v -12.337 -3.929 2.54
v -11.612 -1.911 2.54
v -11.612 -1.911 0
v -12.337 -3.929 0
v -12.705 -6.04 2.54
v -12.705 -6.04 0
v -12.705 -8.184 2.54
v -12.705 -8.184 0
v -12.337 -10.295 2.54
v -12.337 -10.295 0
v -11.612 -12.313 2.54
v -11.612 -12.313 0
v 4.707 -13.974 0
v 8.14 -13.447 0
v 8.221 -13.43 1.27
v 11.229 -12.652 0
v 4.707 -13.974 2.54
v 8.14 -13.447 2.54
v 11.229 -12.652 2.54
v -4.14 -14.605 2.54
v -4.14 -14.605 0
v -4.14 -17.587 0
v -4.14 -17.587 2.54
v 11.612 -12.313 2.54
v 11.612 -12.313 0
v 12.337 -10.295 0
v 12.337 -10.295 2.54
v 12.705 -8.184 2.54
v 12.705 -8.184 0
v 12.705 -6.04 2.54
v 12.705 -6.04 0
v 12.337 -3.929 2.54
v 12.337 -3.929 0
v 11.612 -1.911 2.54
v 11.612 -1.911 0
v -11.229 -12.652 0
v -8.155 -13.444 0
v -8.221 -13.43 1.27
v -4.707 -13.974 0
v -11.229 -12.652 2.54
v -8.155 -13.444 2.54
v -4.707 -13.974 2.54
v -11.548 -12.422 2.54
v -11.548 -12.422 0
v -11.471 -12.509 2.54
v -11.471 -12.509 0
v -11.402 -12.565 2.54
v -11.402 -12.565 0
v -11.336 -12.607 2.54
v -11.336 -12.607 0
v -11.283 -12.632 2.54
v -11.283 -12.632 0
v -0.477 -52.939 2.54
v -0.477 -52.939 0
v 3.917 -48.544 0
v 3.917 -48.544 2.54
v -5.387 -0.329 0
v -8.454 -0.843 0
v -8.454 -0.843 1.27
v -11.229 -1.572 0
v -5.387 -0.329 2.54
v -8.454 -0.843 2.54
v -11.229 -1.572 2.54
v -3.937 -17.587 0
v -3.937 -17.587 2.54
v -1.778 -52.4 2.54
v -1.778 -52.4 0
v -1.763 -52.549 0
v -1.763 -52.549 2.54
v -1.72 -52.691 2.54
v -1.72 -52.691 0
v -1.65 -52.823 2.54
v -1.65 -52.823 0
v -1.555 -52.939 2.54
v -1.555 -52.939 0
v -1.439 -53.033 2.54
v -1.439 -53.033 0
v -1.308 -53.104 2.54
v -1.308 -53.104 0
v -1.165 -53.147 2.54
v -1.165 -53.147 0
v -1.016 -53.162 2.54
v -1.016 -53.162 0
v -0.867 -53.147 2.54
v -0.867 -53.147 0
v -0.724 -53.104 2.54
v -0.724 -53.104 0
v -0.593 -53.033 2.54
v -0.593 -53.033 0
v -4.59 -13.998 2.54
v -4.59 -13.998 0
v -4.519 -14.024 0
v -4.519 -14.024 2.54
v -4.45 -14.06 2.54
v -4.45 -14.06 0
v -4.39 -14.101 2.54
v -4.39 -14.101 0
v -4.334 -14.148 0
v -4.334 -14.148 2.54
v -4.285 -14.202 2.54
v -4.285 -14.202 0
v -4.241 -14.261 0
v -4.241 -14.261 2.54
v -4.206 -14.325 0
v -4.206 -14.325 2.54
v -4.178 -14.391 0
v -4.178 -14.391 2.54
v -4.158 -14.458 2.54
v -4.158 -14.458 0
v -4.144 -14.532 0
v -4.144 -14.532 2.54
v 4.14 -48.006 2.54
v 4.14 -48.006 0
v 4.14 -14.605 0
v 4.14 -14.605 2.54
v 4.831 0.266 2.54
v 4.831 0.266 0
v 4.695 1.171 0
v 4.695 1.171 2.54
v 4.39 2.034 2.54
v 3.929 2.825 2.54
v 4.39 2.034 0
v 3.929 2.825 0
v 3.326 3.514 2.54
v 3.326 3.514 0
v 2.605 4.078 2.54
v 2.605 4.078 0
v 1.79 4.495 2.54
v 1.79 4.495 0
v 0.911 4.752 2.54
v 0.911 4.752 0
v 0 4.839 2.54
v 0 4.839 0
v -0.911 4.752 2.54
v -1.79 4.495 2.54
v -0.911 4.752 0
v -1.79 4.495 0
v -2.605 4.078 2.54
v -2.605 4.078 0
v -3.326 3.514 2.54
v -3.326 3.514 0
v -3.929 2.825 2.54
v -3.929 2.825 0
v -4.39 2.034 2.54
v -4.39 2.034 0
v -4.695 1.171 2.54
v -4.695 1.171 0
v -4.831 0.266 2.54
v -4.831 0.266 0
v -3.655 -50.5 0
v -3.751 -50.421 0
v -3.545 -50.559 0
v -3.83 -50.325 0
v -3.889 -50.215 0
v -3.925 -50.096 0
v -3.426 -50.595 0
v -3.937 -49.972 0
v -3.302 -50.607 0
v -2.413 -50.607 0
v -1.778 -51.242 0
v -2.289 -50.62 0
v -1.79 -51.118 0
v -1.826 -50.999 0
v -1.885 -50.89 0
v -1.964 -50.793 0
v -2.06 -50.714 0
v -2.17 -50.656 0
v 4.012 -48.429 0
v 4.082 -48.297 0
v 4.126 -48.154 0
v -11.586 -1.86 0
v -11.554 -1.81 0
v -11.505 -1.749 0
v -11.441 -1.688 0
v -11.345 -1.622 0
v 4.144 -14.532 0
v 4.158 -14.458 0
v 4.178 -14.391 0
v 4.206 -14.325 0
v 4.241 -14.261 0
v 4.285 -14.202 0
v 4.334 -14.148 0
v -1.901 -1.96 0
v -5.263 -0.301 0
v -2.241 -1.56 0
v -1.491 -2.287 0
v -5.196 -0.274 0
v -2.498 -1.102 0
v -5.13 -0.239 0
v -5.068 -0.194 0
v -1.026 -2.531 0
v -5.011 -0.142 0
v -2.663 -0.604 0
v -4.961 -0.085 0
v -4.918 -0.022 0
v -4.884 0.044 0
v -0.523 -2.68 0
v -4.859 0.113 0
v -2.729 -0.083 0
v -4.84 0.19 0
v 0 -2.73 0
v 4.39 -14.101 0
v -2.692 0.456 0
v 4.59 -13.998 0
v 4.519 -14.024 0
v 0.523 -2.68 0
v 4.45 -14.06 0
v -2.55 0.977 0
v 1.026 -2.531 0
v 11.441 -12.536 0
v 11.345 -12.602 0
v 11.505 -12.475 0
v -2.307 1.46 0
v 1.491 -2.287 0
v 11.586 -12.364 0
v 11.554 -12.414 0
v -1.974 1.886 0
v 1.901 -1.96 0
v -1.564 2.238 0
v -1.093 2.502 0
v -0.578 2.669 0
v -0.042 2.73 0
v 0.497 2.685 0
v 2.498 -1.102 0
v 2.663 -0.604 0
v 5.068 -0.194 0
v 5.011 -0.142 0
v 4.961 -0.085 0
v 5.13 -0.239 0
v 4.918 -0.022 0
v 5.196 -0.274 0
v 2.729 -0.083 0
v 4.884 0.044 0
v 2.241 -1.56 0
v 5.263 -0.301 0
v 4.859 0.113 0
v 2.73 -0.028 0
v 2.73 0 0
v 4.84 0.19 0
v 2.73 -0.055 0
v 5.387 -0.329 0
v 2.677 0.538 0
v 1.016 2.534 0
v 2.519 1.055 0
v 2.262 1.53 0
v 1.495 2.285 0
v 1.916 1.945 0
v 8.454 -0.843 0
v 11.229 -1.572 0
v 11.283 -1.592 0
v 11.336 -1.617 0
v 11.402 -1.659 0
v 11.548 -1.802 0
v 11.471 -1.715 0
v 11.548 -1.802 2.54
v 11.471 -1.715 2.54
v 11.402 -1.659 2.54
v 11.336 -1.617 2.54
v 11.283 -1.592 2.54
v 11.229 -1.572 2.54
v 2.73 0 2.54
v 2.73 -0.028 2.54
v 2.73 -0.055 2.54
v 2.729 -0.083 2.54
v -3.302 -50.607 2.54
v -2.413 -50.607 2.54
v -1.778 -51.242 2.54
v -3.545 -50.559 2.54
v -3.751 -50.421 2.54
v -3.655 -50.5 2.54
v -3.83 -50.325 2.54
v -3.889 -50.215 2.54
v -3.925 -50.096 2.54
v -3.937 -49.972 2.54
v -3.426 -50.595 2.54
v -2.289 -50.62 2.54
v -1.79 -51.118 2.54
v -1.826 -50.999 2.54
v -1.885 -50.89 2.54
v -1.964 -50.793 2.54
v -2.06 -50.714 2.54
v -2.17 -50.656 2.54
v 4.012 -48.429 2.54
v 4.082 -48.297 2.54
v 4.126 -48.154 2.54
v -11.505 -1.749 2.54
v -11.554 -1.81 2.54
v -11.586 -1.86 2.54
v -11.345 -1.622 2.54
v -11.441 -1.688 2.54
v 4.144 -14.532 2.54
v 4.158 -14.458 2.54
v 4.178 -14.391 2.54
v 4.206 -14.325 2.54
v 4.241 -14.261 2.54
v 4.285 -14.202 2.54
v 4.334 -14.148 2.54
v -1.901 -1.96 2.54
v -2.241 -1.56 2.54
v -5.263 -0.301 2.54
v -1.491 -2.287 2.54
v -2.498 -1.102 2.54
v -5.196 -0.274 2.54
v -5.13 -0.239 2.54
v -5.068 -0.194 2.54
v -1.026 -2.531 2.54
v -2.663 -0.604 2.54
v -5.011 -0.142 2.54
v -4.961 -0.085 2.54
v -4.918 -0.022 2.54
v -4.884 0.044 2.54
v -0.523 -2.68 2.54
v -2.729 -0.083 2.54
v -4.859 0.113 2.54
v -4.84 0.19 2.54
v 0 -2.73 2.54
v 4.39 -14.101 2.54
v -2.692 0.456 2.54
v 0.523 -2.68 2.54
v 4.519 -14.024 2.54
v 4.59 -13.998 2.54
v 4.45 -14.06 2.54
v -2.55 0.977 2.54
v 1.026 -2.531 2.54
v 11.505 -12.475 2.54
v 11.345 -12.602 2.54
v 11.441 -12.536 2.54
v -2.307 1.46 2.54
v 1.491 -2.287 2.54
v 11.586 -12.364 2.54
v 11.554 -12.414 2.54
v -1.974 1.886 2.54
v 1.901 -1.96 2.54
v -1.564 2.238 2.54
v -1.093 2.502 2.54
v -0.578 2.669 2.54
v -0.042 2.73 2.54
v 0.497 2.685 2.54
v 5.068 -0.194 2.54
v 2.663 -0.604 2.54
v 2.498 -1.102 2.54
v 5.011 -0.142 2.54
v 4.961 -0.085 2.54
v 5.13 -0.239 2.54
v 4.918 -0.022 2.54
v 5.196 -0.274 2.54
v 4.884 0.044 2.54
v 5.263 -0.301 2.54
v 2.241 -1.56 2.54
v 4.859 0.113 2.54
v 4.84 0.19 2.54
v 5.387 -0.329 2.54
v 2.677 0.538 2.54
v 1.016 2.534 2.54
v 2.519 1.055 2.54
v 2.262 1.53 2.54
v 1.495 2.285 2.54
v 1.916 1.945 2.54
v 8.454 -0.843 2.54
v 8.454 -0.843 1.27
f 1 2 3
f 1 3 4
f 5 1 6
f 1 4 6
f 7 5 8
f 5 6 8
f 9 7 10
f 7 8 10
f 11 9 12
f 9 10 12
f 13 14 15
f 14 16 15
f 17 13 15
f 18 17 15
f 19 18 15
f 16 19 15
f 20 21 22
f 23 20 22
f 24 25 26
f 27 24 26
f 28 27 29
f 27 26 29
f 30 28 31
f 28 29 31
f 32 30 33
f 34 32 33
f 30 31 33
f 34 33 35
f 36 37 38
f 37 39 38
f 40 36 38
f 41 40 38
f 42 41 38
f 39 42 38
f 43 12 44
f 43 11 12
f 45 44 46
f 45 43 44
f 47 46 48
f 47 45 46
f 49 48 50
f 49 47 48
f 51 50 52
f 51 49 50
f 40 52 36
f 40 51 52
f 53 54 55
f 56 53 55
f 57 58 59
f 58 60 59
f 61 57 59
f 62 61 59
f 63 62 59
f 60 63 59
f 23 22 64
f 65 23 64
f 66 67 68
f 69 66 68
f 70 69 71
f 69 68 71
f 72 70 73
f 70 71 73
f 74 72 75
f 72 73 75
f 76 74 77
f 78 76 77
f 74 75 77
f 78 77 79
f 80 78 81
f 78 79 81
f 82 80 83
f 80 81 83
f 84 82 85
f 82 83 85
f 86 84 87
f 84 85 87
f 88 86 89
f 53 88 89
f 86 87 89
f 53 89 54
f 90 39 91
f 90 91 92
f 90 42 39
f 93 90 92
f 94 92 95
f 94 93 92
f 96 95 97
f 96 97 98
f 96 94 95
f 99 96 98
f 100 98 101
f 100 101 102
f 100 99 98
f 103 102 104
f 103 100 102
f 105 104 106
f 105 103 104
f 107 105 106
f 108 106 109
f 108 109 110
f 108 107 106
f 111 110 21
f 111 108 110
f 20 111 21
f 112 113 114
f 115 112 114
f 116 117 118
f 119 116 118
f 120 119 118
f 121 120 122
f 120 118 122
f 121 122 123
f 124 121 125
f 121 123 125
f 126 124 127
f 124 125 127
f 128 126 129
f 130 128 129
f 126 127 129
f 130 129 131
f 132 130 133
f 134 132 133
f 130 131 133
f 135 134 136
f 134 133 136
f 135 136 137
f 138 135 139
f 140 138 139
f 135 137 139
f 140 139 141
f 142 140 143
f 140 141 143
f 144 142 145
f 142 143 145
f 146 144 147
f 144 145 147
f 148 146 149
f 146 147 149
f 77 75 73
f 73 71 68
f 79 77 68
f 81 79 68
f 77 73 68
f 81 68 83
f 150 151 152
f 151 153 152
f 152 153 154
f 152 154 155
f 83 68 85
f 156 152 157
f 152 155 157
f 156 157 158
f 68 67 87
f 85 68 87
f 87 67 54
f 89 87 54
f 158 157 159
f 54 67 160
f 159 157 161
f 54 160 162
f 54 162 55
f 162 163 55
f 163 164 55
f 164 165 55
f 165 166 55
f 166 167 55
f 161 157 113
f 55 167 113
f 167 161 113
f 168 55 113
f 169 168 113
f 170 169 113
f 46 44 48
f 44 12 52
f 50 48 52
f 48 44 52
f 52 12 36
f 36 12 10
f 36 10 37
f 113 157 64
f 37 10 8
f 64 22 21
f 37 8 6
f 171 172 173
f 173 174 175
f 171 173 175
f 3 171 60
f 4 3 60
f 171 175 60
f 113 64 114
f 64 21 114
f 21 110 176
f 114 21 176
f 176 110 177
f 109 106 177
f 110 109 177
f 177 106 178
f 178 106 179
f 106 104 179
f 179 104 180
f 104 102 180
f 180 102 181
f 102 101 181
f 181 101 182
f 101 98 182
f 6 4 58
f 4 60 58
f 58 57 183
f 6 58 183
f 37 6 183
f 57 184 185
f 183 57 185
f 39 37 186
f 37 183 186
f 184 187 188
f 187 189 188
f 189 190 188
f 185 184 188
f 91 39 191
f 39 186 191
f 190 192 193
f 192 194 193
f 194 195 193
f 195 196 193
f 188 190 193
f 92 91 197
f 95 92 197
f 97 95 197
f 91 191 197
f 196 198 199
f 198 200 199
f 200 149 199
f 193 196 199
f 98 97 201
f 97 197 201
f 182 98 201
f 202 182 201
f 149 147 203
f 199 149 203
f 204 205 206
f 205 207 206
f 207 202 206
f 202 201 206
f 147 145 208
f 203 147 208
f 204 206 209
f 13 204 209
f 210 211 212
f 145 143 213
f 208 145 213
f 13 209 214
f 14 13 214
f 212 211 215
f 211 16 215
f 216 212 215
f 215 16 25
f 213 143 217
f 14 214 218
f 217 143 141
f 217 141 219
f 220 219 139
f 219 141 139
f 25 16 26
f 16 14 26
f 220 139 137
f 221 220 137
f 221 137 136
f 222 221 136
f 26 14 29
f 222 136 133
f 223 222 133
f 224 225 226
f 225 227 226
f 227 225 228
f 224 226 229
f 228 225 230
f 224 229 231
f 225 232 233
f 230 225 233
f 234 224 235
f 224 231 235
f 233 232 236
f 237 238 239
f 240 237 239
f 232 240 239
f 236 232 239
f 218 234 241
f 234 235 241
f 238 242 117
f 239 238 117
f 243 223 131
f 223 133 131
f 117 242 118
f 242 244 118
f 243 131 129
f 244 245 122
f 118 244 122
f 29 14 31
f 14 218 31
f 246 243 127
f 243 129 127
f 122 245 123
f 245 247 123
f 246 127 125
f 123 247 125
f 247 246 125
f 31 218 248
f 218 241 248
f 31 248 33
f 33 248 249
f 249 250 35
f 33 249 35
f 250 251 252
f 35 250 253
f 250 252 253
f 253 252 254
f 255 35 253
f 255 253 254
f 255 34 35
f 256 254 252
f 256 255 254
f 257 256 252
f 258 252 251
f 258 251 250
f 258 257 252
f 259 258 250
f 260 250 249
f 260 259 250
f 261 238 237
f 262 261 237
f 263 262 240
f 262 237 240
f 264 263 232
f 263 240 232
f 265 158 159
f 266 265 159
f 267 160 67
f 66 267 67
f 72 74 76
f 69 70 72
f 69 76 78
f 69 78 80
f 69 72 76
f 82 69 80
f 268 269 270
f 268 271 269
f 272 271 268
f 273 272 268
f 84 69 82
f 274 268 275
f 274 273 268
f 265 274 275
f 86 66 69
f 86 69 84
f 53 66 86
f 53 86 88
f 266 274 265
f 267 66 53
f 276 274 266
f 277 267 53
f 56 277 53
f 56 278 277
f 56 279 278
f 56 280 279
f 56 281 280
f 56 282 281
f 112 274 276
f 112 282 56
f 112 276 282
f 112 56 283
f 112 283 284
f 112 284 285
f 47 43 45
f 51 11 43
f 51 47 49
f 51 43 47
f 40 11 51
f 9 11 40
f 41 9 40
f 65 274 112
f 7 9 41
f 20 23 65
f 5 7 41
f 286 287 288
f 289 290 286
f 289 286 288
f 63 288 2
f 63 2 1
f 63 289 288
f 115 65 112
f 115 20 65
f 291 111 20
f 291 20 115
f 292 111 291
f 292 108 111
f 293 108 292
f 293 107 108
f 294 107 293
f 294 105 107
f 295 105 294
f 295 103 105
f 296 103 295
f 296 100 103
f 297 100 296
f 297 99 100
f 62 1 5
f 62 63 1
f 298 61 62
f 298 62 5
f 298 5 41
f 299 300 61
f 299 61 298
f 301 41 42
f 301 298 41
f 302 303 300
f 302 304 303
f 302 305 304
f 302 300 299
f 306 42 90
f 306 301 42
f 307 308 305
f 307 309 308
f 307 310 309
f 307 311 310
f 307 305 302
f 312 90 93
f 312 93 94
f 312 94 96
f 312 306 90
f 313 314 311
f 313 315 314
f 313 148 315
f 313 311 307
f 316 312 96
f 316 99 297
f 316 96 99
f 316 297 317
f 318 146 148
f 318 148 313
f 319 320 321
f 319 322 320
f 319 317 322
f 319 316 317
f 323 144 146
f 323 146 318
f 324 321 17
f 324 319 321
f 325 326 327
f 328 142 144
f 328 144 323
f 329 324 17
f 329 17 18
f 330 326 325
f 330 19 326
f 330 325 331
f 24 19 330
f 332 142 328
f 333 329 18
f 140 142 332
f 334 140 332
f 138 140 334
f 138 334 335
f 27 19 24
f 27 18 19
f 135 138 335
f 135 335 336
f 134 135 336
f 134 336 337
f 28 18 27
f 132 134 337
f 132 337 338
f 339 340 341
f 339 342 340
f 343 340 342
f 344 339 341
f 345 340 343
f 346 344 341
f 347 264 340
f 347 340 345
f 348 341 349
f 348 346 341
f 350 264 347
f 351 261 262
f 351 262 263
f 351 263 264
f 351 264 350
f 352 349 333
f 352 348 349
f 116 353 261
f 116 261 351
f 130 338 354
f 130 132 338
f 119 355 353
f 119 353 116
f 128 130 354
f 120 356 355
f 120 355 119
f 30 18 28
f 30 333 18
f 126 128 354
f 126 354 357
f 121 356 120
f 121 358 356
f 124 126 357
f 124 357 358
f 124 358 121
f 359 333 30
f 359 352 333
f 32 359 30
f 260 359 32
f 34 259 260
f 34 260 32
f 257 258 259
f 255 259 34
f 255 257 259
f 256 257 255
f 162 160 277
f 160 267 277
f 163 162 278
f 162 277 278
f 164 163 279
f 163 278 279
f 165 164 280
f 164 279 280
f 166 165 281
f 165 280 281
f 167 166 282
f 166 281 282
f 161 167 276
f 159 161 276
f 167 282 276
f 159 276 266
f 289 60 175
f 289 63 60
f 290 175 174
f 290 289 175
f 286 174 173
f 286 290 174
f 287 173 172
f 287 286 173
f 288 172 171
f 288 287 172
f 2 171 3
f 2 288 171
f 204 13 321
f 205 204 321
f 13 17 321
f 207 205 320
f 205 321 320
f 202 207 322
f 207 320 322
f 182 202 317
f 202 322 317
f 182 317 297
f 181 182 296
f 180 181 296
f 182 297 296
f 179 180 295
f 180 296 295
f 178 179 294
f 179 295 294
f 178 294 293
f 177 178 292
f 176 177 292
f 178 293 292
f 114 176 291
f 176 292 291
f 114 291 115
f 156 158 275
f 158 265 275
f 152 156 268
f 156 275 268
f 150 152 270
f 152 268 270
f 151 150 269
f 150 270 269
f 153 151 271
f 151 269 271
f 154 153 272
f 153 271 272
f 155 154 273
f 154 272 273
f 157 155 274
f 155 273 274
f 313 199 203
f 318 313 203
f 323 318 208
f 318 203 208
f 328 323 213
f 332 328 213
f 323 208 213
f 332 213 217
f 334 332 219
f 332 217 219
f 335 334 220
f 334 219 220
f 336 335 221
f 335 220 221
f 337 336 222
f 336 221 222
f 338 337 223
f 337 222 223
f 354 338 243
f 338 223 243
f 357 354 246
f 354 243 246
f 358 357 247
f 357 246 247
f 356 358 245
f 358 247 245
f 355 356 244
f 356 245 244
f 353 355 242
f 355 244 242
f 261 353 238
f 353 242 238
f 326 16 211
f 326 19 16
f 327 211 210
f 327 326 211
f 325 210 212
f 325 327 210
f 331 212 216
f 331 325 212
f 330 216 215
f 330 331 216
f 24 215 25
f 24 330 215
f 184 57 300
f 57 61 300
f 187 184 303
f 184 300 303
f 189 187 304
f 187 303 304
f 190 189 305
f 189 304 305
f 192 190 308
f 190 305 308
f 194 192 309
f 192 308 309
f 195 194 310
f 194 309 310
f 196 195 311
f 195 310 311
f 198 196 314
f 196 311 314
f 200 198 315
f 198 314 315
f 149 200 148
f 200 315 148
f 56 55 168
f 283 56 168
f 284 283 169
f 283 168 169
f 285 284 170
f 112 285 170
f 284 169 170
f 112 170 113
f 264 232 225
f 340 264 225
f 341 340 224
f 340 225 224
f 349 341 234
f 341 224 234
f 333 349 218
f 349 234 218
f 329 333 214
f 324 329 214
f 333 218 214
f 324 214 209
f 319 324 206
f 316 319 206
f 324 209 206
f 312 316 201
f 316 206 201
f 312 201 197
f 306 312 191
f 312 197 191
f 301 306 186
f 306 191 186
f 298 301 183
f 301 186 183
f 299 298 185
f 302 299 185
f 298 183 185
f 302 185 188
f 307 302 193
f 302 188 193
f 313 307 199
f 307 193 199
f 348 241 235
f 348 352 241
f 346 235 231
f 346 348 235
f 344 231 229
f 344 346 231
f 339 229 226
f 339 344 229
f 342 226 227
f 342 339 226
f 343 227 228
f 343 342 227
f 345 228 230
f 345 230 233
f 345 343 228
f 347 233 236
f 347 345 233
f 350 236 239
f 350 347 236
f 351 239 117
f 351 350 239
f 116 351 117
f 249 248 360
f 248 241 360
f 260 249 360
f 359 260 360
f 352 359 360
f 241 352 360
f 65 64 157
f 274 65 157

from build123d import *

# Parameters (mm, degrees)
F1_DEPTH = 2.54
F3_DEPTH = 2.54
F4_R     = 0.635


with BuildPart() as f1:
    # F0 (on Top) → F1 (new body)
    with BuildSketch(Plane.XY):
        with BuildLine():
            ThreePointArc((2.7292355161, -0.0830887952), (0, -2.7305), (-2.7292355161, -0.0830887952))
            add(Edge.make_bspline(
                [(-2.7292355161, -0.0830887952), (-3.7940557667, -0.1483067369), (-4.8315057716, -0.2637606285)],
                knots=[1.7238043068, 1.7238043068, 1.7238043068, 1.8439930848, 1.8439930848, 1.8439930848], degree=2, weights=[1, 0.9981948755, 1]))
            add(Edge.make_bspline(
                [(-4.8315057716, -0.2637606285), (-8.5391367, -0.6763688673), (-11.4920446345, -1.6577838797)],
                knots=[1.8439930848, 1.8439930848, 1.8439930848, 2.2675908503, 2.2675908503, 2.2675908503], degree=2, weights=[1, 0.9776543376, 1]))
            ThreePointArc((-11.4920446345, -1.6577838797), (-12.7508, -7.112), (-11.4920446345, -12.5662161203))
            add(Edge.make_bspline(
                [(-11.4920446345, -12.5662161203), (0, -16.3856596579), (11.4920446345, -12.5662161203)],
                knots=[4.0155944569, 4.0155944569, 4.0155944569, 5.4091835039, 5.4091835039, 5.4091835039], degree=2, weights=[1, 0.766903279, 1]))
            ThreePointArc((11.4920446345, -12.5662161203), (12.7508, -7.112), (11.4920446345, -1.6577838797))
            add(Edge.make_bspline(
                [(11.4920446345, -1.6577838797), (8.5391367, -0.6763688673), (4.8315057716, -0.2637606285)],
                knots=[0.8740018033, 0.8740018033, 0.8740018033, 1.2975995688, 1.2975995688, 1.2975995688], degree=2, weights=[1, 0.9776543376, 1]))
            add(Edge.make_bspline(
                [(4.8315057716, -0.2637606285), (3.7940557667, -0.1483067369), (2.7292355161, -0.0830887952)],
                knots=[1.2975995688, 1.2975995688, 1.2975995688, 1.4177883468, 1.4177883468, 1.4177883468], degree=2, weights=[1, 0.9981948755, 1]))
        make_face()
        with BuildLine():
            ThreePointArc((-2.7292355161, -0.0830887952), (-0.0415492082, 2.7301838607), (2.7305, 0))
            ThreePointArc((2.7305, 0), (2.7301838607, -0.0415492082), (2.7292355161, -0.0830887952))
            add(Edge.make_bspline(
                [(4.8315057716, -0.2637606285), (3.7940557667, -0.1483067369), (2.7292355161, -0.0830887952)],
                knots=[1.2975995688, 1.2975995688, 1.2975995688, 1.4177883468, 1.4177883468, 1.4177883468], degree=2, weights=[1, 0.9981948755, 1]))
            ThreePointArc((4.8315057716, -0.2637606285), (0, 4.8387), (-4.8315057716, -0.2637606285))
            add(Edge.make_bspline(
                [(-2.7292355161, -0.0830887952), (-3.7940557667, -0.1483067369), (-4.8315057716, -0.2637606285)],
                knots=[1.7238043068, 1.7238043068, 1.7238043068, 1.8439930848, 1.8439930848, 1.8439930848], degree=2, weights=[1, 0.9981948755, 1]))
        make_face()
    extrude(amount=F1_DEPTH)

    # F2 (on Top) → F3 (join, through all)
    with BuildSketch(Plane.XY):
        with BuildLine():
            add(Edge.make_bspline(
                [(-4.1402, -14.0312996195), (0, -14.4220670272), (4.1402, -14.0312996195)],
                knots=[4.4790722282, 4.4790722282, 4.4790722282, 4.9457057325, 4.9457057325, 4.9457057325], degree=2, weights=[1, 0.9729048959, 1]))
            Line((-4.1402, -14.0312996195), (-4.1402, -17.5872996195))
            Line((-4.1402, -17.5872996195), (-3.937, -17.5872996195))
            Line((-3.937, -17.5872996195), (-3.937, -50.6072996195))
            Line((-3.937, -50.6072996195), (-1.778, -50.6072996195))
            Line((-1.778, -50.6072996195), (-1.778, -52.3998688849))
            ThreePointArc((-1.778, -52.3998688849), (-1.3076047755, -53.1038650887), (-0.4771846327, -52.9386842522))
            Line((-0.4771846327, -52.9386842522), (3.9170153673, -48.5444842522))
            ThreePointArc((3.9170153673, -48.5444842522), (4.0821962038, -48.2972736604), (4.1402, -48.0056688849))
            Line((4.1402, -48.0056688849), (4.1402, -14.0312996195))
        make_face()
    extrude(amount=F3_DEPTH)

    # F4
    f4_edges = [f1.edges().sort_by_distance(p)[0] for p in [
        (-4.1402, -14.0313, 1.27),
        (4.1402, -14.0313, 1.27),
        (11.492045, -12.566216, 1.27),
        (11.492045, -1.657784, 1.27),
        (-11.492045, -1.657784, 1.27),
        (-11.492045, -12.566216, 1.27),
        (-3.937, -50.6073, 1.27),
        (-1.778, -50.6073, 1.27),
        (4.831506, -0.263761, 1.27),
        (-4.831506, -0.263761, 1.27),
    ]]
    fillet(f4_edges, radius=F4_R)


solid = f1.part
